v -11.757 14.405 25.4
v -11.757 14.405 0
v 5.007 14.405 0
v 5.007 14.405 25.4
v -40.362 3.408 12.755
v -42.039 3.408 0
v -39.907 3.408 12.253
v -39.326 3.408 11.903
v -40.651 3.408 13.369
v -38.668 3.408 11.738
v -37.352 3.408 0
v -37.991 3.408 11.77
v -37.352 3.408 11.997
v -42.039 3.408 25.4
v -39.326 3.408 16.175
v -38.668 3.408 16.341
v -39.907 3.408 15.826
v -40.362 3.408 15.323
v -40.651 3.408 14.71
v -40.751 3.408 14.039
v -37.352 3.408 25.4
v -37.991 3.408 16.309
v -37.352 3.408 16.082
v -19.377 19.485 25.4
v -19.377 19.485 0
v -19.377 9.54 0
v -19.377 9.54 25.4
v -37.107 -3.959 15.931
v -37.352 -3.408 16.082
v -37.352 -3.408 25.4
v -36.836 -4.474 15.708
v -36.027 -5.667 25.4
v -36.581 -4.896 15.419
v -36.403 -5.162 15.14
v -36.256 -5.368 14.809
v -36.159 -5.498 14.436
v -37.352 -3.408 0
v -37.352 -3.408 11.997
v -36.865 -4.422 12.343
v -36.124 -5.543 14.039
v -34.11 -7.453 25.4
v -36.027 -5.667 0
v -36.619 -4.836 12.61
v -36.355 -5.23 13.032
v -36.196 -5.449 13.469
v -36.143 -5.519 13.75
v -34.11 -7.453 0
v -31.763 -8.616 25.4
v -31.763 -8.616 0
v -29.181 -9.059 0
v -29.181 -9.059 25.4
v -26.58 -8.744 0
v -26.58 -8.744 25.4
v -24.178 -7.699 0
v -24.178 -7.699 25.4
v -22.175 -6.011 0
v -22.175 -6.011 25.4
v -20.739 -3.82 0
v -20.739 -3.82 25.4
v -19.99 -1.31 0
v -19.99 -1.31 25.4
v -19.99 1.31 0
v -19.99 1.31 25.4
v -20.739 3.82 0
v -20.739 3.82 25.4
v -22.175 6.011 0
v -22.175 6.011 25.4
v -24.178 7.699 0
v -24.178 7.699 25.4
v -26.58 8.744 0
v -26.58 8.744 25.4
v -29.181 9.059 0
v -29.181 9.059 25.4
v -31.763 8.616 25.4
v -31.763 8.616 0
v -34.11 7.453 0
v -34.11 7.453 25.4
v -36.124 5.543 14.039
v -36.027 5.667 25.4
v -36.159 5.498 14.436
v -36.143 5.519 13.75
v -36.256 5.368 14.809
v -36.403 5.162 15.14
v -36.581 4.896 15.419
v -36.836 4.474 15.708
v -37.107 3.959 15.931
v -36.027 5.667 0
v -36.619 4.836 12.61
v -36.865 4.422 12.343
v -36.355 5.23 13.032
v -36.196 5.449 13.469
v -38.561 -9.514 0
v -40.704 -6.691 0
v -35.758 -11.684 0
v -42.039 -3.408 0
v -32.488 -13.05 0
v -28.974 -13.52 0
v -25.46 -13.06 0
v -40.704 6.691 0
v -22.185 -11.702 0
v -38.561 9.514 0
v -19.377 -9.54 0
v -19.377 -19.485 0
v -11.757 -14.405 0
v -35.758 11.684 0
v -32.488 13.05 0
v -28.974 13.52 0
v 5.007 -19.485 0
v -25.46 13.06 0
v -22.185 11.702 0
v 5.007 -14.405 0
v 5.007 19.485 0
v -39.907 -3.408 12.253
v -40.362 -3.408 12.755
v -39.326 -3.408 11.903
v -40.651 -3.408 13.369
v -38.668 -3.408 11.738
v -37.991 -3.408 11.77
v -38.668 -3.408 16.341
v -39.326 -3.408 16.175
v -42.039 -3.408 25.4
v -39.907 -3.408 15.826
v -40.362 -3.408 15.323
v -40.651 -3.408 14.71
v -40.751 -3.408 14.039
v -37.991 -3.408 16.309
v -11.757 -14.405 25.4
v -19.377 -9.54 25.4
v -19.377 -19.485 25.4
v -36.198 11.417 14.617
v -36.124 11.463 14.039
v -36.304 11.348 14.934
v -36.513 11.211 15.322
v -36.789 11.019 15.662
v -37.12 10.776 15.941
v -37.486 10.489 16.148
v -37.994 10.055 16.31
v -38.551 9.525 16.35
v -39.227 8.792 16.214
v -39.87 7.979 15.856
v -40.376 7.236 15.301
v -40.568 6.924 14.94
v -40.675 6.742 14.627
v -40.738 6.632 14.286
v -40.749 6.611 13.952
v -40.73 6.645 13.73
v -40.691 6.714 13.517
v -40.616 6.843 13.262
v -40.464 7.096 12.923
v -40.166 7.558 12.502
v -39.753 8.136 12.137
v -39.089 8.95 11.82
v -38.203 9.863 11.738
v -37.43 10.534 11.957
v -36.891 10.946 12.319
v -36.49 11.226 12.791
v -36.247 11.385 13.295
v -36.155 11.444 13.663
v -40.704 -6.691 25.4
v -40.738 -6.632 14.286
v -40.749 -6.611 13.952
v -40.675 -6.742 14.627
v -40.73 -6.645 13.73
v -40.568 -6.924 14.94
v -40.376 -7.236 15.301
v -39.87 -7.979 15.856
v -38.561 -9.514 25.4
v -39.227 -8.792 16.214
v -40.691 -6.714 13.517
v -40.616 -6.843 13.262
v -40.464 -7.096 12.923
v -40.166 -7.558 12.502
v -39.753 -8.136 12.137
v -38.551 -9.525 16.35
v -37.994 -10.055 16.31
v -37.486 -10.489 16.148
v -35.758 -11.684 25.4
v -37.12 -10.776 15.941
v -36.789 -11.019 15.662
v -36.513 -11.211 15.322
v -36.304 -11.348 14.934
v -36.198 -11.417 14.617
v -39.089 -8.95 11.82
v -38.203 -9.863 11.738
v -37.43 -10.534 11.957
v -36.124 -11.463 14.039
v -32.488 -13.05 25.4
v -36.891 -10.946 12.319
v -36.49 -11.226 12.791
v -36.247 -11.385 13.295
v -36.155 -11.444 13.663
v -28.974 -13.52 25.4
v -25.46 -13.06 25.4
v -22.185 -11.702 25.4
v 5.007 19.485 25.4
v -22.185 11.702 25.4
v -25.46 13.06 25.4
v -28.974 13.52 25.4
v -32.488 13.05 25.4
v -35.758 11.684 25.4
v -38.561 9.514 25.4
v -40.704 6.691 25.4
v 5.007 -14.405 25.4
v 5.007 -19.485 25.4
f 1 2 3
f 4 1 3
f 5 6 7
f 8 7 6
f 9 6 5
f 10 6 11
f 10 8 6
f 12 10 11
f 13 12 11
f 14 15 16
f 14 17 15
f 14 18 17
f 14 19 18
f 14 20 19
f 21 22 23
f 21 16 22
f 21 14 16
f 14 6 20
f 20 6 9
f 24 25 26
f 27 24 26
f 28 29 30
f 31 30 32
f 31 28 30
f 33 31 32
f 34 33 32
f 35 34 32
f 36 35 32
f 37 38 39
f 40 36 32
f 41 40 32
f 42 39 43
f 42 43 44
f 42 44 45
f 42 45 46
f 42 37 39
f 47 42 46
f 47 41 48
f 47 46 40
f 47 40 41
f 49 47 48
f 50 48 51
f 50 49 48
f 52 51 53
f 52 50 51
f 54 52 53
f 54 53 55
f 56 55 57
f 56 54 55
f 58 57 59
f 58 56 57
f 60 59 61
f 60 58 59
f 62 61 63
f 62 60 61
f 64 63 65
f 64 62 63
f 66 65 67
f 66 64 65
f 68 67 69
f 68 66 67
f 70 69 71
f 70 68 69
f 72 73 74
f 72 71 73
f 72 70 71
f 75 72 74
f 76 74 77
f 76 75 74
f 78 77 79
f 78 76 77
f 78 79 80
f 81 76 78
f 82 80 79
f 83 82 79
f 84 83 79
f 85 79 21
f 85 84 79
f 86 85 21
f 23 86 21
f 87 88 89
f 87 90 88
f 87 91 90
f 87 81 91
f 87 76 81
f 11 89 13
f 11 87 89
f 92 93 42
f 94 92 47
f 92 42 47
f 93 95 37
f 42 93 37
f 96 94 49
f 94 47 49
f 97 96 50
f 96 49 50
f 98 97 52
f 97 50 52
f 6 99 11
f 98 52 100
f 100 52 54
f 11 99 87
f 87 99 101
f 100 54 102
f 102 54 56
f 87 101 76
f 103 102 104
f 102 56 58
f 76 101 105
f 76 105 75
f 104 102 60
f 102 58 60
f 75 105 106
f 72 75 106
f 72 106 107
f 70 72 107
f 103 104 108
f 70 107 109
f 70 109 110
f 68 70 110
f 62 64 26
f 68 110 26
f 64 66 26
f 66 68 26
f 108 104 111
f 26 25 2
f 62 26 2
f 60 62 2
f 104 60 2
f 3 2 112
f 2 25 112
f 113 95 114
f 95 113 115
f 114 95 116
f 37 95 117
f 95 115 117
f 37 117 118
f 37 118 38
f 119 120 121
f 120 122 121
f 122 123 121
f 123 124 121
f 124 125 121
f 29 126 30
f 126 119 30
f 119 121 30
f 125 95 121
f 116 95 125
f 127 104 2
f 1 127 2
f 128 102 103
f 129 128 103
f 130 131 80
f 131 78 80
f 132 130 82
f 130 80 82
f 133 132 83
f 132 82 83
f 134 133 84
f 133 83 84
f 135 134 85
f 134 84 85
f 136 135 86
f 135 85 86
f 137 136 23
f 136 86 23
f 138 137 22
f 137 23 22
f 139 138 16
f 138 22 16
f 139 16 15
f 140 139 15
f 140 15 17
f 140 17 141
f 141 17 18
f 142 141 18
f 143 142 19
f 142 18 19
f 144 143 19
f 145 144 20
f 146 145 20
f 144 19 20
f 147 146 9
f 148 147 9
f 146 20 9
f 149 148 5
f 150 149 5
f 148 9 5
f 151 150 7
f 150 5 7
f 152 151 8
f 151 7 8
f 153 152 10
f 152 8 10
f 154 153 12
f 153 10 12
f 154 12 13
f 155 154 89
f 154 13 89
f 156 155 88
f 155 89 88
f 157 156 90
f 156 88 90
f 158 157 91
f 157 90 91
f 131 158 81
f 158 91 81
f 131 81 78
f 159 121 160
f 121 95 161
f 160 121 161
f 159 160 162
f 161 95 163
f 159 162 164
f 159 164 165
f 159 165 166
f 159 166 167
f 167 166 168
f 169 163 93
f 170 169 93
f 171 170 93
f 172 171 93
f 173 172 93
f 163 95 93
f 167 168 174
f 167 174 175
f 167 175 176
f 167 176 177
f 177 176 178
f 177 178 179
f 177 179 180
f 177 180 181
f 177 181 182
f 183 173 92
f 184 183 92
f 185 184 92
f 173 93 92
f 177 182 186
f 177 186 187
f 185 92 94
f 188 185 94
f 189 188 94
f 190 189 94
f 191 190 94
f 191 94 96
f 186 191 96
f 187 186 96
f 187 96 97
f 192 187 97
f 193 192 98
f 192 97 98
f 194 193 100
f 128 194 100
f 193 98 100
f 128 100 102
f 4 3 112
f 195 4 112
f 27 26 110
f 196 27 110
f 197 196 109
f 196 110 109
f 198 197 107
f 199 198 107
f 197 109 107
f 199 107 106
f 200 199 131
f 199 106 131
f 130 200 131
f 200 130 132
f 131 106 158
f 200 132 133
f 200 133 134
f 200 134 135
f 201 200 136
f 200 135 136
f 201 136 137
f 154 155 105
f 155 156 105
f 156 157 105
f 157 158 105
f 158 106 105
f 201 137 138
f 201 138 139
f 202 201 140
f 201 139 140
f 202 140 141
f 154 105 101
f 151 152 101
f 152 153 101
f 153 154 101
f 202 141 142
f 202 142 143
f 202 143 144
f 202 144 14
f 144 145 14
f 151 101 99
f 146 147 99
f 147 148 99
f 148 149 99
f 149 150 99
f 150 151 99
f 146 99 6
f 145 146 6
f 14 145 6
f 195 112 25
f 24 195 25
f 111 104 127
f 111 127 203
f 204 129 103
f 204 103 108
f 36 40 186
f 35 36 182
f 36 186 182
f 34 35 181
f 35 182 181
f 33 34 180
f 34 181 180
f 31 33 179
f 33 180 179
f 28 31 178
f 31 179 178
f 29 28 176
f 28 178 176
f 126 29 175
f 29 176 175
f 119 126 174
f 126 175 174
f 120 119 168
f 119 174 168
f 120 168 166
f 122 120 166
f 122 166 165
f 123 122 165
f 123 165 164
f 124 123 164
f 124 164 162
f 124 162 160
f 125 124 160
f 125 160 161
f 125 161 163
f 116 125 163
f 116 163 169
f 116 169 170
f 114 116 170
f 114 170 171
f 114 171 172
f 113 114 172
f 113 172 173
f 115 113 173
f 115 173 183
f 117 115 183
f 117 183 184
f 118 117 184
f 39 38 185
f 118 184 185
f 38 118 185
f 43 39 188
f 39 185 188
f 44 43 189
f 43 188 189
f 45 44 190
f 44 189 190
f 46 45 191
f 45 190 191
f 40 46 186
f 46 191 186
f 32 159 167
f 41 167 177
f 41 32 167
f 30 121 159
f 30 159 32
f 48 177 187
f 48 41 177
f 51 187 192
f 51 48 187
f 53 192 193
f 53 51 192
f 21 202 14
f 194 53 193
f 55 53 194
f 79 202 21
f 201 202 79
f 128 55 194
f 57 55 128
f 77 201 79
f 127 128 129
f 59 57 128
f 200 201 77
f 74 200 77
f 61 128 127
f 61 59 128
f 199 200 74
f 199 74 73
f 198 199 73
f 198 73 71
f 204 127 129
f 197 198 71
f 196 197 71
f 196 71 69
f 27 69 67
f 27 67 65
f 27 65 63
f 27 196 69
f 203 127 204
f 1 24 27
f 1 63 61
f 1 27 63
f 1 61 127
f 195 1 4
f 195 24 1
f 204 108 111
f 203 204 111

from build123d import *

# Parameters (mm, degrees)
F0_R     = 9.0613386753
F0_W     = 16.764
F0_H     = 5.08
F0_W_2   = 16.7640029008
F1_DEPTH = 25.4
F2_W     = 13.3351978731
F2_H     = 6.8151620217
F3_DEPTH = 25.4
F4_R     = 2.3131415356
F5_DEPTH = 127


with BuildPart() as f1:
    # F0 (on Top) → F1 (new body)
    with BuildSketch(Plane.XY):
        with BuildLine():
            ThreePointArc((-19.3765729799, -9.5403834533), (-16.4600808117, -5.1610380229), (-15.4362256016, 0))
            ThreePointArc((-15.4362256016, 0), (-16.4600808117, 5.1610380229), (-19.3765729799, 9.5403834533))
            Line((-19.3765729799, 9.5403834533), (-19.3765729799, -9.5403834533))
        make_face()
        with BuildLine():
            ThreePointArc((-19.3765729799, 9.5403834533), (-16.4600808117, 5.1610380229), (-15.4362256016, 0))
            ThreePointArc((-15.4362256016, 0), (-16.4600808117, -5.1610380229), (-19.3765729799, -9.5403834533))
            Line((-19.3765729799, -9.5403834533), (-19.3765729799, -19.4854322))
            Line((-19.3765729799, -19.4854322), (-11.7565729799, -19.4854322))
            Line((-11.7565729799, -19.4854322), (-11.7565729799, -14.4054322))
            Line((-11.7565729799, -14.4054322), (-11.7565729799, 14.4054288318))
            Line((-11.7565729799, 14.4054288318), (-11.7565729799, 19.4854288318))
            Line((-11.7565729799, 19.4854288318), (-19.3765729799, 19.4854288318))
            Line((-19.3765729799, 19.4854288318), (-19.3765729799, 9.5403834533))
        make_face()
        with BuildLine():
            Line((-19.3765729799, -9.5403834533), (-19.3765729799, 9.5403834533))
            ThreePointArc((-19.3765729799, 9.5403834533), (-42.4757842164, 0), (-19.3765729799, -9.5403834533))
        make_face()
        with Locations((-28.956004909, 0)):
            Circle(F0_R, mode=Mode.SUBTRACT)
        with Locations((-3.3745729799, 16.9454288318)):
            Rectangle(F0_W, F0_H)
        with Locations((-3.3745715295, -16.9454322)):
            Rectangle(F0_W_2, F0_H)
    extrude(amount=F1_DEPTH)

    # F2 (on face) → F3 (cut)
    with BuildSketch(Plane.XY.offset(25.4)):
        with Locations((-38.0173435843, 0)):
            Rectangle(F2_W, F2_H)
    extrude(amount=-F3_DEPTH, mode=Mode.SUBTRACT)

    # F4 (on Front) → F5 (cut, symmetric)
    with BuildSketch(Plane.XZ):
        with Locations((-38.4375117719, 14.0392342582)):
            Circle(F4_R)
    extrude(amount=F5_DEPTH, both=True, mode=Mode.SUBTRACT)


solid = f1.part
